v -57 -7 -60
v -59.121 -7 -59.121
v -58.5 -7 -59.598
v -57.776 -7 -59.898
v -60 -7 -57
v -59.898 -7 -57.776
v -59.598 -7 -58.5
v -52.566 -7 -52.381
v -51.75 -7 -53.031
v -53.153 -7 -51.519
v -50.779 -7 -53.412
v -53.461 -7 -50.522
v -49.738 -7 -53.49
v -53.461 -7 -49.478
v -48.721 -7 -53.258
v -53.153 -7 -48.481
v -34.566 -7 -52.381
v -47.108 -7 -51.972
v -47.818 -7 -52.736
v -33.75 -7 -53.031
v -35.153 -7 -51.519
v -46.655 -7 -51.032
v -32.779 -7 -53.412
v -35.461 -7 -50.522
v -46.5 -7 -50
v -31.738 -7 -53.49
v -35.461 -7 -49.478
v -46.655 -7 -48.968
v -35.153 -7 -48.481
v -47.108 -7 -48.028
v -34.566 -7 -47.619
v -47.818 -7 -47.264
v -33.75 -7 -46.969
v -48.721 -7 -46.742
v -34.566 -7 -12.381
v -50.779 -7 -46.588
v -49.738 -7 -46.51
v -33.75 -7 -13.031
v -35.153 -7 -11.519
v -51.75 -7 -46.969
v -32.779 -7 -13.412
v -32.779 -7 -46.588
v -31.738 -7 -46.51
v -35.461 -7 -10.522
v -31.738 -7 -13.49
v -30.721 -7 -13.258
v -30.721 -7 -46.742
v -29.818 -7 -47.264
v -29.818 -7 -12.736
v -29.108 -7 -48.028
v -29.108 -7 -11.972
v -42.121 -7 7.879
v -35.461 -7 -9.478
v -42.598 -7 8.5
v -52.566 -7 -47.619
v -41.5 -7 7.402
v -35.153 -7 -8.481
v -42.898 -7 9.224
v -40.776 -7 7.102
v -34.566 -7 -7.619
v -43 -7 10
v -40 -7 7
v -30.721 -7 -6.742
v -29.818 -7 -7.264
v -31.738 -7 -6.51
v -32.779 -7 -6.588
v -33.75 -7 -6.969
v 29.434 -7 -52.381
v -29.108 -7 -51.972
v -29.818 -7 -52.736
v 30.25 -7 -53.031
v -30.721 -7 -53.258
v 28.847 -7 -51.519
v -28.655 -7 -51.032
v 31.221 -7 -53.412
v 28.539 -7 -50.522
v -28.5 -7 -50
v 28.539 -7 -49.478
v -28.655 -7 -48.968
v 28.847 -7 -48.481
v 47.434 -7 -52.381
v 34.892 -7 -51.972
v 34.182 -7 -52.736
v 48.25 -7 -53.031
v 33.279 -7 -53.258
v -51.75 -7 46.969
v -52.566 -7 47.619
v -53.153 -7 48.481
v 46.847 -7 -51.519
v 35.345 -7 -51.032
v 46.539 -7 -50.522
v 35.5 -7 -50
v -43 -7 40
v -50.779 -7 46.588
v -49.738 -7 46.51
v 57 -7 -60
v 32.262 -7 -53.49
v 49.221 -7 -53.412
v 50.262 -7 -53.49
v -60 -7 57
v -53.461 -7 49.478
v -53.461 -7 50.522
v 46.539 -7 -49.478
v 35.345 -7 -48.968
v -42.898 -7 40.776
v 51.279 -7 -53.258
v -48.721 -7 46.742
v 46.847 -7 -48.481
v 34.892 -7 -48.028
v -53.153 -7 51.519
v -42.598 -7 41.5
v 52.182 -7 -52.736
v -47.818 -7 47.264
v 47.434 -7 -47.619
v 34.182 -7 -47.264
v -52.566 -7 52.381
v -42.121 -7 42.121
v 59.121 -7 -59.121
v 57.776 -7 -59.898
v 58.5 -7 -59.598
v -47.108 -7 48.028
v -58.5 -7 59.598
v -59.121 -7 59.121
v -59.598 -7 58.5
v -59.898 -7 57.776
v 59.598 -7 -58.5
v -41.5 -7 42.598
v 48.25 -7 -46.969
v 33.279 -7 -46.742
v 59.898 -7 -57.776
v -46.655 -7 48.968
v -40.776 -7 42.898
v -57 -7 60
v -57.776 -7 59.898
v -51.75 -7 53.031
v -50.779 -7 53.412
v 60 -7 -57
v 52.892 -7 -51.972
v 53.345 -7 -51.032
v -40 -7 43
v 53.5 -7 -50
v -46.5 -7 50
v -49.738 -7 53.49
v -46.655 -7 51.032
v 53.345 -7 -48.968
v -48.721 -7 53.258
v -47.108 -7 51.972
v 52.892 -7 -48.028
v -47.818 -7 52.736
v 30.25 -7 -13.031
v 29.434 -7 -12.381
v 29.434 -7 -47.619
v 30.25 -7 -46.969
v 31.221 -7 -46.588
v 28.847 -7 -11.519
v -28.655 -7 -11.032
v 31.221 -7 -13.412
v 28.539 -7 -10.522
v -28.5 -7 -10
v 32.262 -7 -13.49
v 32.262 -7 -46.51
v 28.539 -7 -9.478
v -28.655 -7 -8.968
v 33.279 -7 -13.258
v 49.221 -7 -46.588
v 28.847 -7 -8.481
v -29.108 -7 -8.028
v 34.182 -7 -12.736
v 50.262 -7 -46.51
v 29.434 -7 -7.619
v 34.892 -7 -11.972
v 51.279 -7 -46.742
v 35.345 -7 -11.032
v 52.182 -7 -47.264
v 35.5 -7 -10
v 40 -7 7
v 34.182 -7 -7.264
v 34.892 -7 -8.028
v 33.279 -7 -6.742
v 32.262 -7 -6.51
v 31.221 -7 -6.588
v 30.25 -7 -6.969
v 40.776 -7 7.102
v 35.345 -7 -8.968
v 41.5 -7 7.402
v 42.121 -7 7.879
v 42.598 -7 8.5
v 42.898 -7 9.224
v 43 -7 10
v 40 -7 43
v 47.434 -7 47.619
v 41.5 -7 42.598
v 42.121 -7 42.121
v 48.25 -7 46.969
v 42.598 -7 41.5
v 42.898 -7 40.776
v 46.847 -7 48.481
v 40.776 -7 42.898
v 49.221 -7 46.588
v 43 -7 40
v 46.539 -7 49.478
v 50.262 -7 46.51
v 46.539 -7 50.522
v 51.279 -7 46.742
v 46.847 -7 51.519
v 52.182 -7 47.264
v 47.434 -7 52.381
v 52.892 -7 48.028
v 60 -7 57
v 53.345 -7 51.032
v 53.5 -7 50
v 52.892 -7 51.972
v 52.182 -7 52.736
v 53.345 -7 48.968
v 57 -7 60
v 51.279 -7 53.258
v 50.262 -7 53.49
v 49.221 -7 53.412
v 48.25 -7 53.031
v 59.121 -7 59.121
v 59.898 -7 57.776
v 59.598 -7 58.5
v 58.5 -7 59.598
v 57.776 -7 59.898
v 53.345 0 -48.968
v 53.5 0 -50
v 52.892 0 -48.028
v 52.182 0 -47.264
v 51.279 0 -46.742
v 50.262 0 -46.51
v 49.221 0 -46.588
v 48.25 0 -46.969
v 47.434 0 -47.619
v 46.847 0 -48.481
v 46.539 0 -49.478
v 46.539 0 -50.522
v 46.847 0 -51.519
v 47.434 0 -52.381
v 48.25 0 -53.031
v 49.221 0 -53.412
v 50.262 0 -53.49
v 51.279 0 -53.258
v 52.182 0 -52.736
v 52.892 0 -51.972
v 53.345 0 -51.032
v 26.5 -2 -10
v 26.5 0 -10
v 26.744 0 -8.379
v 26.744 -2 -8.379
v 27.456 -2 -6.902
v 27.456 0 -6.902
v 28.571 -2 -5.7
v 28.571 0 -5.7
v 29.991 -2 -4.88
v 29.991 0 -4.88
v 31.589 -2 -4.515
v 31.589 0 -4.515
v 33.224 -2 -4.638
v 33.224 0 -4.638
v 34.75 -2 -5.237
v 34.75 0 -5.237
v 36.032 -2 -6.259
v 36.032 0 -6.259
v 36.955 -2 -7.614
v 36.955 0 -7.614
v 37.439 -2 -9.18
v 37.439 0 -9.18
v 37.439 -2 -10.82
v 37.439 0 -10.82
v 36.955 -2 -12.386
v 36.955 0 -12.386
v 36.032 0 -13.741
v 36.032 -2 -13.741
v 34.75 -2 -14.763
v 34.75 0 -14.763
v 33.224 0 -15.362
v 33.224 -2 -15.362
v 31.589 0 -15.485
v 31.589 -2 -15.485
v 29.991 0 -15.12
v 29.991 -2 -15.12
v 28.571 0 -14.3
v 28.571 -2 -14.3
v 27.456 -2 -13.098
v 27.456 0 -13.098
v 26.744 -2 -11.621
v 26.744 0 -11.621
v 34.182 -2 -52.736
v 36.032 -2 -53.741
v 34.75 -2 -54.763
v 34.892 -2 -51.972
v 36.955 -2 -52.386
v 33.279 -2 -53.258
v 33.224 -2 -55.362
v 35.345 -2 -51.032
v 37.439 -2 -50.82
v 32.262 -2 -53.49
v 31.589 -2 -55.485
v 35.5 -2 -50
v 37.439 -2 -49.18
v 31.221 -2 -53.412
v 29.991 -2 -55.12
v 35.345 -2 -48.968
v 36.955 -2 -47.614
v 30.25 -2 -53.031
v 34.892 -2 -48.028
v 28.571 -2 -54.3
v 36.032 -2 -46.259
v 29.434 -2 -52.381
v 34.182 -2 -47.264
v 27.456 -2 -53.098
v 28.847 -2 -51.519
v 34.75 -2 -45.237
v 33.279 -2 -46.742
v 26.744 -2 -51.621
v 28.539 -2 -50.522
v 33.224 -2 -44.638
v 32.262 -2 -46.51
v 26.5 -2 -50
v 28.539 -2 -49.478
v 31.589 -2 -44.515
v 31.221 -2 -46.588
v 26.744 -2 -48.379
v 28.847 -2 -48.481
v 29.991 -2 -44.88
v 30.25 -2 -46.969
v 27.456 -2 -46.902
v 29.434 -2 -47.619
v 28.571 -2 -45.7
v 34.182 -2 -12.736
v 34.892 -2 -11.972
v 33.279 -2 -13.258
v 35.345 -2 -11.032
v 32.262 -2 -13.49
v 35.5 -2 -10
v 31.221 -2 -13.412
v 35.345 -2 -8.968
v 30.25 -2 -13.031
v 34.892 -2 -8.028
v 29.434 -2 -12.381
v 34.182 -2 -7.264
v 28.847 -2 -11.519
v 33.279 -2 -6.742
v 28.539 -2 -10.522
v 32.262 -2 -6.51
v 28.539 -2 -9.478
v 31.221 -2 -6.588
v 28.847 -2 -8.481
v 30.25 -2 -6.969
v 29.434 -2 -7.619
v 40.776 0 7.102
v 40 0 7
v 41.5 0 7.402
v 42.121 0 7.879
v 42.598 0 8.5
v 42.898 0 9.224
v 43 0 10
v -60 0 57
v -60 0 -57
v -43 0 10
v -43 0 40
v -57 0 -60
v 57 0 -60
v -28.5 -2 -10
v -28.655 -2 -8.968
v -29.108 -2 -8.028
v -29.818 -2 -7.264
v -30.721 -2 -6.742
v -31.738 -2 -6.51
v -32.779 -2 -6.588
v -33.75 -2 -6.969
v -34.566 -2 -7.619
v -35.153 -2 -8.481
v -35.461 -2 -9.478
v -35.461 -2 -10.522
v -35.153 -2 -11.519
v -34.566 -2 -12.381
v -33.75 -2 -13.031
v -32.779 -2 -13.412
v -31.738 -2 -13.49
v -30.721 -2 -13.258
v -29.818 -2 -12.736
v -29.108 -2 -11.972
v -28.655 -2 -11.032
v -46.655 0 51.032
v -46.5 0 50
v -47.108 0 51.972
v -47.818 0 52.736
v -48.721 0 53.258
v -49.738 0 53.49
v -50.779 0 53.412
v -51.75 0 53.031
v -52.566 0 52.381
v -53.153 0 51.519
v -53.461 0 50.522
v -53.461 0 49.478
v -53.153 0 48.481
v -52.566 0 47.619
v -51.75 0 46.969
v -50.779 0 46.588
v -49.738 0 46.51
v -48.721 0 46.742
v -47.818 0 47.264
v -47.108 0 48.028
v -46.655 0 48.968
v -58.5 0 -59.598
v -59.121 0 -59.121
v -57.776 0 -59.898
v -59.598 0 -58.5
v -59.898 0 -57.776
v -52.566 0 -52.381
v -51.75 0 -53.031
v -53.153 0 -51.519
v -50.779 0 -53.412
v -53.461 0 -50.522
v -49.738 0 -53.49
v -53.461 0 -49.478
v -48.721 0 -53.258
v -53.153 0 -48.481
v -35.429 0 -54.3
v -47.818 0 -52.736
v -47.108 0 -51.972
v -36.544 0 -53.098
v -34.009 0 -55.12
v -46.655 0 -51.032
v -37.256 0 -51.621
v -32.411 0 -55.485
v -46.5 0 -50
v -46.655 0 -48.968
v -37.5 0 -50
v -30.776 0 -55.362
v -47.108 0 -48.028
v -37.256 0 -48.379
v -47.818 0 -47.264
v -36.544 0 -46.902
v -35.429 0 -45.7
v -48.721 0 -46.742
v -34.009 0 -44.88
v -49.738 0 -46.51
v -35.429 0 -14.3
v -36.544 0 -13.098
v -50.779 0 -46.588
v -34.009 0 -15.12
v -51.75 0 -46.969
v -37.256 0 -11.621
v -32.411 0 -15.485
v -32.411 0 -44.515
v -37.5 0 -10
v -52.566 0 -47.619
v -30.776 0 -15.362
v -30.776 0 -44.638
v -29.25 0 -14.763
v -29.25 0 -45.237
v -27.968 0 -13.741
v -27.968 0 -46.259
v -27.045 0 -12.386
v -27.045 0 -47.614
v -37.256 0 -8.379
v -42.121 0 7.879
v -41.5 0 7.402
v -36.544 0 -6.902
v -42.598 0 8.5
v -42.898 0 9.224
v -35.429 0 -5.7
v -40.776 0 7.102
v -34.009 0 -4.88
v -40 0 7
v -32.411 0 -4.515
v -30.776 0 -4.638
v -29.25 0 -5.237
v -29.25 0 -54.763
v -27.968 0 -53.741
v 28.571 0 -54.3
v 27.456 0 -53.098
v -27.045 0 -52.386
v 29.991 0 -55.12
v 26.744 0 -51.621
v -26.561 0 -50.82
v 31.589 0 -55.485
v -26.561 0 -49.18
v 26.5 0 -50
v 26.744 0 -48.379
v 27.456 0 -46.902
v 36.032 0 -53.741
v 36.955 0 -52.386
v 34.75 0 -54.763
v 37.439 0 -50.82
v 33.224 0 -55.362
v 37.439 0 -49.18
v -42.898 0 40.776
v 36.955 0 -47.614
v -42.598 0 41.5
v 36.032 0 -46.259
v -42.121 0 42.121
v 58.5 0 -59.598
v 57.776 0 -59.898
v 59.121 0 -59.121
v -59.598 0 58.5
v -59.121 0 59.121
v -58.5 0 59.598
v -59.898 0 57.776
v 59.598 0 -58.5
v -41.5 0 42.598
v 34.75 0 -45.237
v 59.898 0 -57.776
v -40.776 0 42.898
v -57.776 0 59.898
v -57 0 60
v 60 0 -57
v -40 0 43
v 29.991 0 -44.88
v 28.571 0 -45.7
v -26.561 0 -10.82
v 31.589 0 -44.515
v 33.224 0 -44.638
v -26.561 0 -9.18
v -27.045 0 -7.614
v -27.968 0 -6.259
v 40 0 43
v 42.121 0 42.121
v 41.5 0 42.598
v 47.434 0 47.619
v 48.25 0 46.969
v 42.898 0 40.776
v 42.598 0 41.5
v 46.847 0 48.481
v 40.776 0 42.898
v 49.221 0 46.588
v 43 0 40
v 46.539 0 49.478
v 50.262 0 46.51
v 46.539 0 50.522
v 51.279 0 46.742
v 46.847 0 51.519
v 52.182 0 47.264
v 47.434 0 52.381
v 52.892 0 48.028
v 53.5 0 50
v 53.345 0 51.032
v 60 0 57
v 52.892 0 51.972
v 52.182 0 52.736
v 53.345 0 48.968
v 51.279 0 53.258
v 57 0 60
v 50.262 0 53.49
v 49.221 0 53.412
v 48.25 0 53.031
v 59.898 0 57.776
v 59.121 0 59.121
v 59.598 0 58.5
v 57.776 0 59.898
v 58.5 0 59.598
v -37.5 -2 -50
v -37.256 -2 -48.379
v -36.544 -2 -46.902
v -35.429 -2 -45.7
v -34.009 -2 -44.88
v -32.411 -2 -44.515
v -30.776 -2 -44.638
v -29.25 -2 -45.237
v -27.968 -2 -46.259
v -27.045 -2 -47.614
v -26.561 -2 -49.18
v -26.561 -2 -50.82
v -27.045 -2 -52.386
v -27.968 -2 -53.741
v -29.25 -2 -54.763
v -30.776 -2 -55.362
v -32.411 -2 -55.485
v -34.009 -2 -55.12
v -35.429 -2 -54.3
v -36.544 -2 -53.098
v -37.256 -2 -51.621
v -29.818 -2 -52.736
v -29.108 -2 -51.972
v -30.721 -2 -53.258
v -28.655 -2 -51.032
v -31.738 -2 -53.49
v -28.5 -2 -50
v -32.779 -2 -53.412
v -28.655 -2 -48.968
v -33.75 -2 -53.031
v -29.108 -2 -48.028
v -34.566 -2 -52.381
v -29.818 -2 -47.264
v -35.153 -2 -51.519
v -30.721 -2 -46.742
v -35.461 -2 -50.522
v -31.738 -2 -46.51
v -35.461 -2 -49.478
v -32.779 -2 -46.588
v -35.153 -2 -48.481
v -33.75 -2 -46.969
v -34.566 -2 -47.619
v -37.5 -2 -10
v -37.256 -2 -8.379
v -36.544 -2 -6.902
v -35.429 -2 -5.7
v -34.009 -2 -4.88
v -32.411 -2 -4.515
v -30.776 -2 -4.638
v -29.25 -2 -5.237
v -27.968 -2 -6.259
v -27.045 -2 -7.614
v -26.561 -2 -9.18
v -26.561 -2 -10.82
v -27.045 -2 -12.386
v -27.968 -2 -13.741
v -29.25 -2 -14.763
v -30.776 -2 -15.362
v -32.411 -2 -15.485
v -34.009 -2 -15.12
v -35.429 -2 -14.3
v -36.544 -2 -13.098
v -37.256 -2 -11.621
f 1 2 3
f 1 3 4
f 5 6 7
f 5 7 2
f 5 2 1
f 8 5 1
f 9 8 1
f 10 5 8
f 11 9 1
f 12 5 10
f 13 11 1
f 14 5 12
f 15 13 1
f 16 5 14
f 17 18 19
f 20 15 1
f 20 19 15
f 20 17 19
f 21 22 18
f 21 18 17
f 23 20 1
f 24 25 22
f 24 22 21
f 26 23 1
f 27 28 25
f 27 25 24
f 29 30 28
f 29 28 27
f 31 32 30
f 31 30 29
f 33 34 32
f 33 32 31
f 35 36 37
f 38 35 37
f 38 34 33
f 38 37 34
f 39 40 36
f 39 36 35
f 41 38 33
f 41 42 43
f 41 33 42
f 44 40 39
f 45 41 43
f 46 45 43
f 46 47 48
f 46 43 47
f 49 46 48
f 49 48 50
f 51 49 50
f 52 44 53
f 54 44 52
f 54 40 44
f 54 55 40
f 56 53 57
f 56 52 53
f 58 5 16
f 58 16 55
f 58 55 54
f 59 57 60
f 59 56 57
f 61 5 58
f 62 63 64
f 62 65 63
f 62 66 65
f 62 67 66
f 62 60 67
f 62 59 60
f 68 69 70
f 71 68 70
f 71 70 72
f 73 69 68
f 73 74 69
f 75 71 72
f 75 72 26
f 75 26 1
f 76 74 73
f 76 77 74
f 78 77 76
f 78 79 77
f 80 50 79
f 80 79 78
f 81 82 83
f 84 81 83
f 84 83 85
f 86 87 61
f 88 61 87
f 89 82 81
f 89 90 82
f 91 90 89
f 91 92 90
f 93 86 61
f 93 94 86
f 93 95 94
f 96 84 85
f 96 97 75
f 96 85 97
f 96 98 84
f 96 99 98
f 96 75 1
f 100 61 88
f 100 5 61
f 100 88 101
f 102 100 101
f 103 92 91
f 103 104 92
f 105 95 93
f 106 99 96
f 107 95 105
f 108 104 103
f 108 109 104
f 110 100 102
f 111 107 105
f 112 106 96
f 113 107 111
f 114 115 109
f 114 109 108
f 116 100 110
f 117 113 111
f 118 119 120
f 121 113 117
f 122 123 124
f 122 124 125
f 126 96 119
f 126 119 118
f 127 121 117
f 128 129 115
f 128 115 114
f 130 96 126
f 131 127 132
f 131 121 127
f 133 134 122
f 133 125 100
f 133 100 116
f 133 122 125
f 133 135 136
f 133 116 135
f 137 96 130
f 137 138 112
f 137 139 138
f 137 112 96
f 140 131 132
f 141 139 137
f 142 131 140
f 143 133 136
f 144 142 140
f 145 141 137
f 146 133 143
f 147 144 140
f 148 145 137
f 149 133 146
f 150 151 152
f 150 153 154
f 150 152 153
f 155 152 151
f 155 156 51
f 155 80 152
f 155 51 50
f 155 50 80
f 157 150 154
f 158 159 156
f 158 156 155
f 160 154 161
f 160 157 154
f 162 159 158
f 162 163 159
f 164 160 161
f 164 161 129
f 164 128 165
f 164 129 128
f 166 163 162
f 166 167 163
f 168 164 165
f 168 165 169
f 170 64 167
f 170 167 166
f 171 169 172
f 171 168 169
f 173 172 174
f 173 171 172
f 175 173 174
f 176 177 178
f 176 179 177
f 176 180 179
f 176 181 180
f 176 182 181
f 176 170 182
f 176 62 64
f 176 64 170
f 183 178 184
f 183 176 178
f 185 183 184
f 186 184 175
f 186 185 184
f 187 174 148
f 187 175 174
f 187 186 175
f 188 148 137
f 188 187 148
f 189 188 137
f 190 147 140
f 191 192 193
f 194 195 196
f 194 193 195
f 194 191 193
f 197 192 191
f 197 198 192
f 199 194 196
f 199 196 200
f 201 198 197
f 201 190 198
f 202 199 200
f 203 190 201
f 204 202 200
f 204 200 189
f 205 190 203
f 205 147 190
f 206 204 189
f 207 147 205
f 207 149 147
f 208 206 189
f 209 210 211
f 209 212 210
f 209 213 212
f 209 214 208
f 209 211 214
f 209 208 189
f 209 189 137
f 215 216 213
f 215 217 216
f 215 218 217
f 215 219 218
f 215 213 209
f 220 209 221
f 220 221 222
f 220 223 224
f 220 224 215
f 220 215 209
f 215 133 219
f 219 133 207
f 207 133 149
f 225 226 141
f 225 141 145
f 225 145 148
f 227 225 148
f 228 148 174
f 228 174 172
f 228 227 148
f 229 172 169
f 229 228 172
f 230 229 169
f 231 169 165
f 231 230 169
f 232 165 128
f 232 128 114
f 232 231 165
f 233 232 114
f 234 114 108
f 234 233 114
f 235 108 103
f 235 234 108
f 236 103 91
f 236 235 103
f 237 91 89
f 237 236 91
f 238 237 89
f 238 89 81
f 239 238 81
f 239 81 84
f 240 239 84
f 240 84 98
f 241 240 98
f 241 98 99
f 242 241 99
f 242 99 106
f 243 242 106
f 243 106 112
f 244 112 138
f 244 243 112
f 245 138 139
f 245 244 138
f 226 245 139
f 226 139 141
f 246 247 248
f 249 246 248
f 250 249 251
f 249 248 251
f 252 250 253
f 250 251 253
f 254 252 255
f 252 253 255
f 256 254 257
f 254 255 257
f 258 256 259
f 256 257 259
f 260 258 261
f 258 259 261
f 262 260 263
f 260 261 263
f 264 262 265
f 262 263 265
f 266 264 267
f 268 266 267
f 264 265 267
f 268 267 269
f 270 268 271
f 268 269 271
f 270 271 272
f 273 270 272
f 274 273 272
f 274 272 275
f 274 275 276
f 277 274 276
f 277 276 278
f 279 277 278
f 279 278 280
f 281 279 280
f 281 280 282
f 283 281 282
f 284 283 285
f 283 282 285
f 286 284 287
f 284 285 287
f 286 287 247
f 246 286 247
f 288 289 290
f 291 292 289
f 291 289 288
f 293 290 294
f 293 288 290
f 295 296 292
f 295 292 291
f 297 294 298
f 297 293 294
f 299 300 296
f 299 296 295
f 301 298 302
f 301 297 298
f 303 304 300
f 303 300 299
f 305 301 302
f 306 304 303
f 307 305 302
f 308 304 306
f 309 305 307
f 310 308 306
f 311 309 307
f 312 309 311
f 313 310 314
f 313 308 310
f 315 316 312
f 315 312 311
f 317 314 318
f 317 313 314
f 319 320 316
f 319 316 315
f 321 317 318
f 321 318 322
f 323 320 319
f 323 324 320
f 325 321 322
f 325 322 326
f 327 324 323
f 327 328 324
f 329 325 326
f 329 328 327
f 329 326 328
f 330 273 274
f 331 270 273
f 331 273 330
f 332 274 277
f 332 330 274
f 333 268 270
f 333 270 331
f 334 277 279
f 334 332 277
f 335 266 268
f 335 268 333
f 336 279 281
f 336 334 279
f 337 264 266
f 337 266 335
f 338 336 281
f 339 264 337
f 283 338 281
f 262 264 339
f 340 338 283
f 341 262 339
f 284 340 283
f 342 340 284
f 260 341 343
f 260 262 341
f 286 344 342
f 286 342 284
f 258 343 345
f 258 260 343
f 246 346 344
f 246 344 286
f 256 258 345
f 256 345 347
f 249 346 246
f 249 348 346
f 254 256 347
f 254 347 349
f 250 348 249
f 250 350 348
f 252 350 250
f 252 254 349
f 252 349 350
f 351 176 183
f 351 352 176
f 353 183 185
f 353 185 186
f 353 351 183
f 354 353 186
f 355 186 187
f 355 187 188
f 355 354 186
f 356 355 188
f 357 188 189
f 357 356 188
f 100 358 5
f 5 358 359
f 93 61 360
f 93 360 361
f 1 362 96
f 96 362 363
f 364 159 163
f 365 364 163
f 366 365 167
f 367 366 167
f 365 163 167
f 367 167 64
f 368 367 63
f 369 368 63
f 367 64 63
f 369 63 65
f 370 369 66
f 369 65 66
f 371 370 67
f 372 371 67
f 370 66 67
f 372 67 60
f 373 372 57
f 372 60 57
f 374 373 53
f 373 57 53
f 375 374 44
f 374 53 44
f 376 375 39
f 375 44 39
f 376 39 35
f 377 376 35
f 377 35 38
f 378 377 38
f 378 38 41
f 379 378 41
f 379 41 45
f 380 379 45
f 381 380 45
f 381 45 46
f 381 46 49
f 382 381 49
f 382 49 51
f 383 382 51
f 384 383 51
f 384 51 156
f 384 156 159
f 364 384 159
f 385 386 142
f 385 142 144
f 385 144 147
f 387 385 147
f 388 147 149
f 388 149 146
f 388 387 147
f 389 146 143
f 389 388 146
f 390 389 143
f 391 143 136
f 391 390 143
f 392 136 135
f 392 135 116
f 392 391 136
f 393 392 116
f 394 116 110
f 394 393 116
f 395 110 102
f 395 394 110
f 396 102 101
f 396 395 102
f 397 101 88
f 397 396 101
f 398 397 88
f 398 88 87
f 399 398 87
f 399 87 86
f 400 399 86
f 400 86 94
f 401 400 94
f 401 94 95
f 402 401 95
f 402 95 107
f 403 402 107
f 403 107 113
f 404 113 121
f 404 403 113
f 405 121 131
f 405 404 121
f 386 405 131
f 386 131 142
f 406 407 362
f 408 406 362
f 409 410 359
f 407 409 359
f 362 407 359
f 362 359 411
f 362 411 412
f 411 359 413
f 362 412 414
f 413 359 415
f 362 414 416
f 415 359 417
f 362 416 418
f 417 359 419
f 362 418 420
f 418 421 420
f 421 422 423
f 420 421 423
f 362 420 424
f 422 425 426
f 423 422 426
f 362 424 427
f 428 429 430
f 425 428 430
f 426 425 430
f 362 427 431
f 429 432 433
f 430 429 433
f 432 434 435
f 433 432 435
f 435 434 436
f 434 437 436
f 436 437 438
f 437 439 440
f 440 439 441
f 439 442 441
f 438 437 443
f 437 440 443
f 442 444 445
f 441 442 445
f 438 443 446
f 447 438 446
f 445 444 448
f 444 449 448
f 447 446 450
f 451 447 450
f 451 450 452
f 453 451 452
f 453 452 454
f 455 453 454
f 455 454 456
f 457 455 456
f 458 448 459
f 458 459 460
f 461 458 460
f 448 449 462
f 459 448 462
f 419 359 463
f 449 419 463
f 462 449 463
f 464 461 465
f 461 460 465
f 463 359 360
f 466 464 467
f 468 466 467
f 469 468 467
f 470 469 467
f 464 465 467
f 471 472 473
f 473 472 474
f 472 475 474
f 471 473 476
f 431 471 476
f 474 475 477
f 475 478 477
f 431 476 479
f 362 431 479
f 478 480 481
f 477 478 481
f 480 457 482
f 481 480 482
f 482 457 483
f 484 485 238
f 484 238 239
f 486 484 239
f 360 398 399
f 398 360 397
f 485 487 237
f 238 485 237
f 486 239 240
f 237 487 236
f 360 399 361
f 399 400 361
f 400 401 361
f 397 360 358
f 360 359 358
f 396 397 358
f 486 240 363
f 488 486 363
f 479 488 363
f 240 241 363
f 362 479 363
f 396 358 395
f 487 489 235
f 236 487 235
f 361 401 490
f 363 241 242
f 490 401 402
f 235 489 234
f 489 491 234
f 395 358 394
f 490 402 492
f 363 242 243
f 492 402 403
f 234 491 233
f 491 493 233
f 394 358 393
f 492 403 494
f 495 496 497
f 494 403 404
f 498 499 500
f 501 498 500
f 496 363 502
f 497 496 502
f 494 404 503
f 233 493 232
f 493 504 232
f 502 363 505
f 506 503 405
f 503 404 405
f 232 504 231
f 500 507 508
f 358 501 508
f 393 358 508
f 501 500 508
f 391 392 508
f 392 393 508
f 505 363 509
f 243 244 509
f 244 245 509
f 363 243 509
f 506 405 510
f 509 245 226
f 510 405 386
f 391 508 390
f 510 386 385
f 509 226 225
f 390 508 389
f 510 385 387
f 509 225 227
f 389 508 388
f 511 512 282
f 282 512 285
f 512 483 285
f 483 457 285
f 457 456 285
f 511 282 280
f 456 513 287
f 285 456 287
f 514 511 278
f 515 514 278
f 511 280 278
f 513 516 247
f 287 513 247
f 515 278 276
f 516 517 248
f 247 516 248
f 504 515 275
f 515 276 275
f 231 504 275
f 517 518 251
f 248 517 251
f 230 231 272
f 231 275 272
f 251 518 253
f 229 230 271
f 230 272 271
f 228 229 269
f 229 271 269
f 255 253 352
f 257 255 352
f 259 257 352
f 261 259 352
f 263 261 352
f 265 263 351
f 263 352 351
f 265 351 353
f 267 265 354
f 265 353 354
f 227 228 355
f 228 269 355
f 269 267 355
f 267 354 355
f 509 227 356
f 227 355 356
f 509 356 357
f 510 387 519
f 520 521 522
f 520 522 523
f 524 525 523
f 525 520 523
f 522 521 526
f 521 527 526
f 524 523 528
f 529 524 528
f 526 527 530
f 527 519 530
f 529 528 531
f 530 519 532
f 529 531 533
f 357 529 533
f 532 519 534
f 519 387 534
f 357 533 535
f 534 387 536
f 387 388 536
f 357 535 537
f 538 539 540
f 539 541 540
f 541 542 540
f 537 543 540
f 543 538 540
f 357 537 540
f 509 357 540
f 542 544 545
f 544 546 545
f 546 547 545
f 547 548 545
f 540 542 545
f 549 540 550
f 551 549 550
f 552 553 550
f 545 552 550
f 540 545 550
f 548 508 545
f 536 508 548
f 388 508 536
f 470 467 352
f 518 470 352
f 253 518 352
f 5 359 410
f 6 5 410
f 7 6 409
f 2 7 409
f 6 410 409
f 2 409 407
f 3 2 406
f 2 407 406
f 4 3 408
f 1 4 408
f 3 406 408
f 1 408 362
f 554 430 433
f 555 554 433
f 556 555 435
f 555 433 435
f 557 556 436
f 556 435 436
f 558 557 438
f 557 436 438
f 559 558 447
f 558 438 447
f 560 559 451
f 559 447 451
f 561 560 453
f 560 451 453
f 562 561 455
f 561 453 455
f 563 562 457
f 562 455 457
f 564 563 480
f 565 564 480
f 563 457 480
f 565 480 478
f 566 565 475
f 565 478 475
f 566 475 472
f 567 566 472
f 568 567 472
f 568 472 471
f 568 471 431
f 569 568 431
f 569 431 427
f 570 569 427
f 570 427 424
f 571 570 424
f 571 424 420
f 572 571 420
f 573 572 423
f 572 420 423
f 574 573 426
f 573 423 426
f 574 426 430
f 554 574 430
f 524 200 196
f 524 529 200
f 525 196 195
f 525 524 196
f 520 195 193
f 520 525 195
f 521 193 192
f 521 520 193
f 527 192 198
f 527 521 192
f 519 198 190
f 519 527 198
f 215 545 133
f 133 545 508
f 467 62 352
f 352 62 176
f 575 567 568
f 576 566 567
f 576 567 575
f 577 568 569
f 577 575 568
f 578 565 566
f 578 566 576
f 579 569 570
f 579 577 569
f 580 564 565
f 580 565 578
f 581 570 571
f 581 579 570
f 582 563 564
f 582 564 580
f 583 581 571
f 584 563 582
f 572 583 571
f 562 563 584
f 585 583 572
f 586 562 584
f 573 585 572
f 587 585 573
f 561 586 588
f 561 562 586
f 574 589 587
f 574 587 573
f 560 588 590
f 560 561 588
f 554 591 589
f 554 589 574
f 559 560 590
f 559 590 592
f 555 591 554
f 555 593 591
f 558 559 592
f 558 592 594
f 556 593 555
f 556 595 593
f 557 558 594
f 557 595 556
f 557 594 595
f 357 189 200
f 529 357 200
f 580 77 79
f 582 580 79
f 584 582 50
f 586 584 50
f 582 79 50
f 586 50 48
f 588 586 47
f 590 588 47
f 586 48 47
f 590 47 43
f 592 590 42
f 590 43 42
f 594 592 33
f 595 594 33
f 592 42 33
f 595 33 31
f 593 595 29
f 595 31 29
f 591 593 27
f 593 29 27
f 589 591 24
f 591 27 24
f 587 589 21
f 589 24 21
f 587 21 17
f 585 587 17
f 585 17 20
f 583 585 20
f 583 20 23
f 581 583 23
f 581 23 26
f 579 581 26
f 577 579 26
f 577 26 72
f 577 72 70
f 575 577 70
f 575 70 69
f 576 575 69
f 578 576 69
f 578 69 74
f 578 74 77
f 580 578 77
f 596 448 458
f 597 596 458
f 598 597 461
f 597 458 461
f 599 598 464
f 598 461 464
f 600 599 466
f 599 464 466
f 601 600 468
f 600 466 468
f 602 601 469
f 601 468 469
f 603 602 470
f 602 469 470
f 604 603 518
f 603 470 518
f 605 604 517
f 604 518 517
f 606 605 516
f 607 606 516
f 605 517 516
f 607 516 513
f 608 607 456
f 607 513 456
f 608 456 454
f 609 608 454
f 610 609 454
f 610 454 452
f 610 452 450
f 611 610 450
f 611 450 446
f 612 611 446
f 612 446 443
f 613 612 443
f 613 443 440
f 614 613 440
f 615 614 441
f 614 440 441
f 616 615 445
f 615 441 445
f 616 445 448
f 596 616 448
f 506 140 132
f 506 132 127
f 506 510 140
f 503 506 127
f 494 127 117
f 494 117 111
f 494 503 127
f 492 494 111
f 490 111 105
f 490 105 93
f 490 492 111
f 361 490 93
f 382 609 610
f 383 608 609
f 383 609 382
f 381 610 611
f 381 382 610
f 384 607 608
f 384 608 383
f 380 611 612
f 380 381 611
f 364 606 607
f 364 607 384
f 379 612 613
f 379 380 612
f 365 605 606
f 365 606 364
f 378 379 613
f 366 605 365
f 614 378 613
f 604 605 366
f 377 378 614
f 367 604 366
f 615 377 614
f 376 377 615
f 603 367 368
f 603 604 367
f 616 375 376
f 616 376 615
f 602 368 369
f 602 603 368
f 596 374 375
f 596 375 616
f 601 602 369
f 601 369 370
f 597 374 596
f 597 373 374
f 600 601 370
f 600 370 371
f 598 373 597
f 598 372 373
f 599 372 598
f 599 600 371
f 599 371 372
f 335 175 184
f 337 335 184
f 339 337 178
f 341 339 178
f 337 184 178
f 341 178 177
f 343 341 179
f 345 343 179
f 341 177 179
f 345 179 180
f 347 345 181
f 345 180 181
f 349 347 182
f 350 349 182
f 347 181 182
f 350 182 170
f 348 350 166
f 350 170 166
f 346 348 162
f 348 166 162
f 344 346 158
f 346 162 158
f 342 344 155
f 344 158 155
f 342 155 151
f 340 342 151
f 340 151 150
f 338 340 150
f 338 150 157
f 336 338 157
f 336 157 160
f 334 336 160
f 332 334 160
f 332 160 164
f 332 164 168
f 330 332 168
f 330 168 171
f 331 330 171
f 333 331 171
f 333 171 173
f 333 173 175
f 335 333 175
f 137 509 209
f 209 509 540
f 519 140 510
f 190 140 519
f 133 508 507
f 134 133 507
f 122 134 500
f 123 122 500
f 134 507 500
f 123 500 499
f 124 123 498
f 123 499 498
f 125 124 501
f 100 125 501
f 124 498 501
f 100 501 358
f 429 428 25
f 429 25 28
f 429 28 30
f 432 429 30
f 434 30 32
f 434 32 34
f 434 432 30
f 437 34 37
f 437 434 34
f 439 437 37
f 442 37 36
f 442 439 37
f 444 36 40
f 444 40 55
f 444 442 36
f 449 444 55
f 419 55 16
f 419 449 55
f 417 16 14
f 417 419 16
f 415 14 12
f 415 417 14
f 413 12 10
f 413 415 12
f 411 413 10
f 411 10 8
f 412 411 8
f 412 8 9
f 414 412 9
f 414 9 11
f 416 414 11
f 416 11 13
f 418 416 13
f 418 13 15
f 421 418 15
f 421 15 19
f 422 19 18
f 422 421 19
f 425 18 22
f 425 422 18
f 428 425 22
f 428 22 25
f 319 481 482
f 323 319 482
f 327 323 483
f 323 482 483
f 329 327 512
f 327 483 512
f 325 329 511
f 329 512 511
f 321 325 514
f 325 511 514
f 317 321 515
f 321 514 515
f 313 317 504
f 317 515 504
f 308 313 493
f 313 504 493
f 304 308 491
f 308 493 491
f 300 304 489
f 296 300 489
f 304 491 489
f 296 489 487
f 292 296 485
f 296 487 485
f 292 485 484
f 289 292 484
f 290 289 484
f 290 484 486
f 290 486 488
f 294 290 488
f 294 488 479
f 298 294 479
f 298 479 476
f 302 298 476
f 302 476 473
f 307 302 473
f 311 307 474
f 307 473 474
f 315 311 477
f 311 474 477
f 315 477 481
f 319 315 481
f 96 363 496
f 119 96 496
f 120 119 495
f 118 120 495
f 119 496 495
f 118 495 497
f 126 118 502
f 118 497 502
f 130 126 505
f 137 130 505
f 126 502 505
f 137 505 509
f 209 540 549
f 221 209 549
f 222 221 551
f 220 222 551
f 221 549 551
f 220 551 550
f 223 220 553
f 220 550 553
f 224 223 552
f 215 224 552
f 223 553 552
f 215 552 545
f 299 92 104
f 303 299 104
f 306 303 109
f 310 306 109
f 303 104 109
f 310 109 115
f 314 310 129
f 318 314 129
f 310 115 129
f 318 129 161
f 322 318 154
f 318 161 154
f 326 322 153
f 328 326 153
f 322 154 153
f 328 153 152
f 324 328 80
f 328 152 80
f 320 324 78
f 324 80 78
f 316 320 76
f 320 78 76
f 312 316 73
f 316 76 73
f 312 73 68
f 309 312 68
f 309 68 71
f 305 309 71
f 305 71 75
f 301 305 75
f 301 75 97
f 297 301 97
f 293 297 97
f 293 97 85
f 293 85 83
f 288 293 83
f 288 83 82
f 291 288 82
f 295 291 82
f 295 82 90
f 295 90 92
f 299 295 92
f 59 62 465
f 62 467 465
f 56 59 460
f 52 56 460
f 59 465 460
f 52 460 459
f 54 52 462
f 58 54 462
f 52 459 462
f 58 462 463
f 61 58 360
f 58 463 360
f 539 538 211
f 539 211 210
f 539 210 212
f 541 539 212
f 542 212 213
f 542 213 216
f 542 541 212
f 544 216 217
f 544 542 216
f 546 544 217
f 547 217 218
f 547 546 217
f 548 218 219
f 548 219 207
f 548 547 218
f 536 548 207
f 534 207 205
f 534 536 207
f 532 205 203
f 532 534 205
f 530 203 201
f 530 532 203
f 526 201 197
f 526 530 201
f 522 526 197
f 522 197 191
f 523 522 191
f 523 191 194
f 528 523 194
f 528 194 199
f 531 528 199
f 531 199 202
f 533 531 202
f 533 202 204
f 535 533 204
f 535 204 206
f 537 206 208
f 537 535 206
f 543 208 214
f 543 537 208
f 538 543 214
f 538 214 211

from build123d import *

# Parameters (mm, degrees)
F0_R     = 3.5
F1_DEPTH = 7
F2_R     = 3.5
F3_DEPTH = 25
F4_R     = 5.5
F5_DEPTH = 2
F6_W     = 86
F6_H     = 36
F7_DEPTH = 25
F8_R     = 3


with BuildPart() as f1:
    # F0 (on Front) → F1 (new body)
    with BuildSketch(Plane.XZ):
        with BuildLine():
            Line((-57, -60), (57, -60))
            ThreePointArc((57, -60), (59.12132, -59.12132), (60, -57))
            Line((60, -57), (60, 57))
            ThreePointArc((60, 57), (59.12132, 59.12132), (57, 60))
            Line((57, 60), (-57, 60))
            ThreePointArc((-57, 60), (-59.12132, 59.12132), (-60, 57))
            Line((-60, 57), (-60, -57))
            ThreePointArc((-60, -57), (-59.12132, -59.12132), (-57, -60))
        make_face()
        with Locations((-50, -50)):
            Circle(F0_R, mode=Mode.SUBTRACT)
        with Locations((50, -50)):
            Circle(F0_R, mode=Mode.SUBTRACT)
        with Locations((-50, 50)):
            Circle(F0_R, mode=Mode.SUBTRACT)
        with Locations((50, 50)):
            Circle(F0_R, mode=Mode.SUBTRACT)
    extrude(amount=F1_DEPTH)

    # F2 (on face) → F3 (cut)
    with BuildSketch(Plane.XZ.offset(7)):
        with Locations((-32, -10)):
            Circle(F2_R)
        with Locations((-32, -50)):
            Circle(F2_R)
        with Locations((32, -50)):
            Circle(F2_R)
        with Locations((32, -10)):
            Circle(F2_R)
    extrude(amount=-F3_DEPTH, mode=Mode.SUBTRACT)

    # F4 (on face) → F5 (cut)
    with BuildSketch(Plane(origin=(0, 0, 0), x_dir=(-1, 0, 0), z_dir=(0, 1, 0))):
        with Locations((-32, -10)):
            Circle(F4_R)
        with Locations((-32, -50)):
            Circle(F4_R)
        with Locations((32, -50)):
            Circle(F4_R)
        with Locations((32, -10)):
            Circle(F4_R)
    extrude(amount=-F5_DEPTH, mode=Mode.SUBTRACT)

    # F6 (on face) → F7 (cut)
    with BuildSketch(Plane.XZ.offset(7)):
        with Locations((0, 25)):
            Rectangle(F6_W, F6_H)
    extrude(amount=-F7_DEPTH, mode=Mode.SUBTRACT)

    # F8
    f8_edges = [f1.edges().sort_by_distance(p)[0] for p in [
        (-43, -3.5, 43),
        (-43, -3.5, 7),
        (43, -3.5, 43),
        (43, -3.5, 7),
    ]]
    fillet(f8_edges, radius=F8_R)


solid = f1.part
